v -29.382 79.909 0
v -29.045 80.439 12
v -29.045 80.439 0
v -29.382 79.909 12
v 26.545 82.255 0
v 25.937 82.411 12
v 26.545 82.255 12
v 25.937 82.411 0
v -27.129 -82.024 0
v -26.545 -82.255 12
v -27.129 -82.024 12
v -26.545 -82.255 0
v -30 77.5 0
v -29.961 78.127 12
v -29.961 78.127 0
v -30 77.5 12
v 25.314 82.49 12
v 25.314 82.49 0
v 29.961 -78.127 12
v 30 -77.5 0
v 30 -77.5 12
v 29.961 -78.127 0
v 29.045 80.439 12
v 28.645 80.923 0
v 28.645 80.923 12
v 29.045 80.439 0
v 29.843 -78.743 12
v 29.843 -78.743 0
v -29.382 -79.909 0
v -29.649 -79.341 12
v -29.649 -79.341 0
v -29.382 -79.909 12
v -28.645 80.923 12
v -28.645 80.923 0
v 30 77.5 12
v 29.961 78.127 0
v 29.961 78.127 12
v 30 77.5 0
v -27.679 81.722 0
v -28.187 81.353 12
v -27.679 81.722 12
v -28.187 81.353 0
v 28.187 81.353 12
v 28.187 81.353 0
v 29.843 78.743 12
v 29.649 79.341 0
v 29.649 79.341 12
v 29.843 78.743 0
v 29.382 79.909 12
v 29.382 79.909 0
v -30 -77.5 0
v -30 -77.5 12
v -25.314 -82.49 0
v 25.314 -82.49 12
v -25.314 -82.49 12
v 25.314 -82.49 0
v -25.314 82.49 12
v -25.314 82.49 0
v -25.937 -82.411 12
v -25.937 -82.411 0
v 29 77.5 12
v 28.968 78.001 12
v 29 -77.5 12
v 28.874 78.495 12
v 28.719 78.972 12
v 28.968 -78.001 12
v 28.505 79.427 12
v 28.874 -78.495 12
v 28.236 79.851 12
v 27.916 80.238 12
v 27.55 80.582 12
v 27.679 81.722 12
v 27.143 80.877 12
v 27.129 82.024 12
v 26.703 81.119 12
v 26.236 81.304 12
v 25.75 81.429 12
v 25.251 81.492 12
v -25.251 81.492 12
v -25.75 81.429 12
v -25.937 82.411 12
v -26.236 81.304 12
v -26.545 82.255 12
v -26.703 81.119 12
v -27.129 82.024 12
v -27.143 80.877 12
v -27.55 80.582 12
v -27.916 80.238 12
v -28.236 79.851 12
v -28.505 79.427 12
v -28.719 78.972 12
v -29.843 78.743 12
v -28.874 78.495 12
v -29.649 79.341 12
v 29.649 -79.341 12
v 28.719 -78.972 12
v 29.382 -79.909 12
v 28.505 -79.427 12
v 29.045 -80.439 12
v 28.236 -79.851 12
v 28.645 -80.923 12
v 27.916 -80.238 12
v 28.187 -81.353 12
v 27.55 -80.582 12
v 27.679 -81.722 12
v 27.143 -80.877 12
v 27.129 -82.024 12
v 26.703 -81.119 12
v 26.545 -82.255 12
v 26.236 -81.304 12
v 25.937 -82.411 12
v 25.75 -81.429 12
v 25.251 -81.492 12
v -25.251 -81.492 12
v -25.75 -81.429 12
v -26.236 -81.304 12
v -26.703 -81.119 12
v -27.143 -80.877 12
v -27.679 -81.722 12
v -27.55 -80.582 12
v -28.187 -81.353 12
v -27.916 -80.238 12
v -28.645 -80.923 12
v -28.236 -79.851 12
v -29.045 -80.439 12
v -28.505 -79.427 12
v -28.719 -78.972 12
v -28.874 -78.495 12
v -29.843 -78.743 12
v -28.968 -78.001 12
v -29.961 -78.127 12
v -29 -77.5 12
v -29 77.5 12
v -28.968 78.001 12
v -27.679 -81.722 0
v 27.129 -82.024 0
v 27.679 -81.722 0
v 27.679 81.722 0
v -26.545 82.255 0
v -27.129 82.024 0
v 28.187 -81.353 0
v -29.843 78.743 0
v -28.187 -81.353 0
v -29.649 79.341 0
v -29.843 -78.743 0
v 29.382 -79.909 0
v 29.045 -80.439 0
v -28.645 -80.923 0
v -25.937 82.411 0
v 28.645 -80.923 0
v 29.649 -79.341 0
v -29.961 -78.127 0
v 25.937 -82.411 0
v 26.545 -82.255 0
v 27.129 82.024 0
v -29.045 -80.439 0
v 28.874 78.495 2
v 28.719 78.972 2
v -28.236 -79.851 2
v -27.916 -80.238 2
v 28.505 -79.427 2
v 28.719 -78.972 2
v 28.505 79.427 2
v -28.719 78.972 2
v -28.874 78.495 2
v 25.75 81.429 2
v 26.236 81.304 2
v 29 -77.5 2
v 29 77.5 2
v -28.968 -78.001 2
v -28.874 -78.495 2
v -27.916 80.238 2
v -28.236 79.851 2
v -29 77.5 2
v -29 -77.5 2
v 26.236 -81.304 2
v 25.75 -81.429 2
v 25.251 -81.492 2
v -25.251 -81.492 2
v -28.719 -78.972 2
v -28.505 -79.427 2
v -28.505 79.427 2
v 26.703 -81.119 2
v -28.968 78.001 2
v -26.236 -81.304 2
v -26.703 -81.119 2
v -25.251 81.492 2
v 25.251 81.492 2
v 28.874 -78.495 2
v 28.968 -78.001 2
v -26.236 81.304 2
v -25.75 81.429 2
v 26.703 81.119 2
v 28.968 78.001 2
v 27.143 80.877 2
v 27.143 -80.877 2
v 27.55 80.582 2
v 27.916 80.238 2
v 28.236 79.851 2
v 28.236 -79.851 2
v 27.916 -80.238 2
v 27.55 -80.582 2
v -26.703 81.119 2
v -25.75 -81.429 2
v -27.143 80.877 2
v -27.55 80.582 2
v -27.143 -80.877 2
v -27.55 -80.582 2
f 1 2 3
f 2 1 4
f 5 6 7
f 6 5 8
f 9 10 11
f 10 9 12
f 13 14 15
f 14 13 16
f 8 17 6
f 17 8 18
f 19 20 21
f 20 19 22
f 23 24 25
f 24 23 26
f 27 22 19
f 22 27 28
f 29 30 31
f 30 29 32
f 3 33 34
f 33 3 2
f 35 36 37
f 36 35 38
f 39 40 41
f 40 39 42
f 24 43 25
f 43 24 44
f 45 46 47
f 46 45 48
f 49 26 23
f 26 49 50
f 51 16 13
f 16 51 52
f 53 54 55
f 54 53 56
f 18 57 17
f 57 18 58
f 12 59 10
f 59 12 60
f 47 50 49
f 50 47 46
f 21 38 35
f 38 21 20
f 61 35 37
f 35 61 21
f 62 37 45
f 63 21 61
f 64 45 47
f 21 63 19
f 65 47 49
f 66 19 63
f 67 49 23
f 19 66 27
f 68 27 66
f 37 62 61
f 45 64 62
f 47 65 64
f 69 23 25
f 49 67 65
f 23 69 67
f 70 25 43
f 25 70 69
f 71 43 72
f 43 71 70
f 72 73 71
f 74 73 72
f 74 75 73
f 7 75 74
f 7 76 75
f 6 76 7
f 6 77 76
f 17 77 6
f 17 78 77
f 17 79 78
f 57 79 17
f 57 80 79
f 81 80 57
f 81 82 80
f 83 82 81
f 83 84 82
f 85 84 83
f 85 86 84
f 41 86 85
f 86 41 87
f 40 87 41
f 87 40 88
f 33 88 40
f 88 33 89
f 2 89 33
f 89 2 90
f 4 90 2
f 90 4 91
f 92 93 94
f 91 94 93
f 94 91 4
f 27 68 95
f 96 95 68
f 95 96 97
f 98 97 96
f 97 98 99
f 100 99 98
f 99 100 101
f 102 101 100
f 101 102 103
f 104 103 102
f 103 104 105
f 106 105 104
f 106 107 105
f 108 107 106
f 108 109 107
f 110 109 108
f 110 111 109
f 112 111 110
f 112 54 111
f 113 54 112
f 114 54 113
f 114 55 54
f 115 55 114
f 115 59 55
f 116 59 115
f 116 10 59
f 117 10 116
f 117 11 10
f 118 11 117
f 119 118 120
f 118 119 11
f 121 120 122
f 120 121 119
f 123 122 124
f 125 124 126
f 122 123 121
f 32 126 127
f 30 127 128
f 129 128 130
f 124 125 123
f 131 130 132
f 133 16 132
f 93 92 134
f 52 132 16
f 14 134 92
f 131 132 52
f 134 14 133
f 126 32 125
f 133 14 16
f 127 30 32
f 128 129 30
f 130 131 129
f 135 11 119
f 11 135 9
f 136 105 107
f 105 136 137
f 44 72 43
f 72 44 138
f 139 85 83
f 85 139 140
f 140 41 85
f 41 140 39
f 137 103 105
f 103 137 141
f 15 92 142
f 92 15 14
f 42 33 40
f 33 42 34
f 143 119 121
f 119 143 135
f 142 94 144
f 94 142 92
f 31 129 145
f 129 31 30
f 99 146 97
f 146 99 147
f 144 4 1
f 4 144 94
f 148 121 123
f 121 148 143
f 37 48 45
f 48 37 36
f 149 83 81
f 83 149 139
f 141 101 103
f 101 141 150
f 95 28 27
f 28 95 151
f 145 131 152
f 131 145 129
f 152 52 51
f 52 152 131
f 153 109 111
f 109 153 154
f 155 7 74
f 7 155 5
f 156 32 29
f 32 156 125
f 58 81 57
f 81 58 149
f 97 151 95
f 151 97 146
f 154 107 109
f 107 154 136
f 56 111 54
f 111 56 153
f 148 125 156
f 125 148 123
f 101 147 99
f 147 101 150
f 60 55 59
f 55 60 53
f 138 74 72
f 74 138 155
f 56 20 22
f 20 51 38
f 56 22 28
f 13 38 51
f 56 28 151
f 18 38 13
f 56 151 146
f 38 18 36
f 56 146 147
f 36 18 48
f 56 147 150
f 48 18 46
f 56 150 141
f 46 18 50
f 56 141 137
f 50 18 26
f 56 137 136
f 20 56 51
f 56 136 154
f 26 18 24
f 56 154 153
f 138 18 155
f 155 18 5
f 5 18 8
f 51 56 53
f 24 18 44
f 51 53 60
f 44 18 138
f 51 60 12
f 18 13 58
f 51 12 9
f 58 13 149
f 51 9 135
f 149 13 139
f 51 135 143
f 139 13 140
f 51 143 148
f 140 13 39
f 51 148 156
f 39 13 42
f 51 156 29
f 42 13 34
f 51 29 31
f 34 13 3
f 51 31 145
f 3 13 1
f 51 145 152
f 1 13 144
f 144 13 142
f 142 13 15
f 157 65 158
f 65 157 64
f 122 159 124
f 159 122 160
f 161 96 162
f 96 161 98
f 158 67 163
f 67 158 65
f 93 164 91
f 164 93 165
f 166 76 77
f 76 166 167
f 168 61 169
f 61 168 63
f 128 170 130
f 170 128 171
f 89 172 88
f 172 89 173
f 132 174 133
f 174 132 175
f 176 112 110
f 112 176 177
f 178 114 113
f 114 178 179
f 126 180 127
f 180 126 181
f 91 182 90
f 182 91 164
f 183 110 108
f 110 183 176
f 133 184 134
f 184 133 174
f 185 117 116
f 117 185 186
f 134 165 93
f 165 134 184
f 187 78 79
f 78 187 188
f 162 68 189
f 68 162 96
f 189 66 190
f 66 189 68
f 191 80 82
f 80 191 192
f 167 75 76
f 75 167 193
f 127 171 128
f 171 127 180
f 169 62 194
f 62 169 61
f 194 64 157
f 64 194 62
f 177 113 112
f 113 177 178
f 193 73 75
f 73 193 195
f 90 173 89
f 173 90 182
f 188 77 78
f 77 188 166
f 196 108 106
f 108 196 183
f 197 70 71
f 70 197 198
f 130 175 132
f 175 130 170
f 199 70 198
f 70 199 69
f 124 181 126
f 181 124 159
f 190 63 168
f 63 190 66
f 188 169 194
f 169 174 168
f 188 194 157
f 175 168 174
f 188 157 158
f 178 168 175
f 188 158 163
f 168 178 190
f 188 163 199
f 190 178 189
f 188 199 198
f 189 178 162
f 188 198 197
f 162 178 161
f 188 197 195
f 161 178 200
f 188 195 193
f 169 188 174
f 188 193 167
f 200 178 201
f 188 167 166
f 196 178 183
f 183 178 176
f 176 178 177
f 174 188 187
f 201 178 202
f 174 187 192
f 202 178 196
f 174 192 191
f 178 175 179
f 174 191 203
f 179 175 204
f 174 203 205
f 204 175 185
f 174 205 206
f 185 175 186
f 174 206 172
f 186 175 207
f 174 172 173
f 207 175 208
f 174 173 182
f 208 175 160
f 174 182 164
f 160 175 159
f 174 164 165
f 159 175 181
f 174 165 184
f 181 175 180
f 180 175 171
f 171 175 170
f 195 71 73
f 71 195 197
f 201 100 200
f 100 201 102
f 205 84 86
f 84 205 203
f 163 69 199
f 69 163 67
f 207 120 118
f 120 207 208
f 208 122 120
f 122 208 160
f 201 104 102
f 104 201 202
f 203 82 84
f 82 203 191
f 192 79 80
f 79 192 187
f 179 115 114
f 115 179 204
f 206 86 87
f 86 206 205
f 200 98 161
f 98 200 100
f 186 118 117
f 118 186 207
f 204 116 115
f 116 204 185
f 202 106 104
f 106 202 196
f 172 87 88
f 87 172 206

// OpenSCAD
$fn = 50;


difference() {
	union() {
		hull() {
			translate(v = [-25.0000000000, 77.5000000000, 0]) {
				cylinder(h = 12, r = 5);
			}
			translate(v = [25.0000000000, 77.5000000000, 0]) {
				cylinder(h = 12, r = 5);
			}
			translate(v = [-25.0000000000, -77.5000000000, 0]) {
				cylinder(h = 12, r = 5);
			}
			translate(v = [25.0000000000, -77.5000000000, 0]) {
				cylinder(h = 12, r = 5);
			}
		}
	}
	union() {
		translate(v = [0, 0, 2]) {
			hull() {
				translate(v = [-25.0000000000, 77.5000000000, 0]) {
					cylinder(h = 10, r = 4);
				}
				translate(v = [25.0000000000, 77.5000000000, 0]) {
					cylinder(h = 10, r = 4);
				}
				translate(v = [-25.0000000000, -77.5000000000, 0]) {
					cylinder(h = 10, r = 4);
				}
				translate(v = [25.0000000000, -77.5000000000, 0]) {
					cylinder(h = 10, r = 4);
				}
			}
		}
	}
}
